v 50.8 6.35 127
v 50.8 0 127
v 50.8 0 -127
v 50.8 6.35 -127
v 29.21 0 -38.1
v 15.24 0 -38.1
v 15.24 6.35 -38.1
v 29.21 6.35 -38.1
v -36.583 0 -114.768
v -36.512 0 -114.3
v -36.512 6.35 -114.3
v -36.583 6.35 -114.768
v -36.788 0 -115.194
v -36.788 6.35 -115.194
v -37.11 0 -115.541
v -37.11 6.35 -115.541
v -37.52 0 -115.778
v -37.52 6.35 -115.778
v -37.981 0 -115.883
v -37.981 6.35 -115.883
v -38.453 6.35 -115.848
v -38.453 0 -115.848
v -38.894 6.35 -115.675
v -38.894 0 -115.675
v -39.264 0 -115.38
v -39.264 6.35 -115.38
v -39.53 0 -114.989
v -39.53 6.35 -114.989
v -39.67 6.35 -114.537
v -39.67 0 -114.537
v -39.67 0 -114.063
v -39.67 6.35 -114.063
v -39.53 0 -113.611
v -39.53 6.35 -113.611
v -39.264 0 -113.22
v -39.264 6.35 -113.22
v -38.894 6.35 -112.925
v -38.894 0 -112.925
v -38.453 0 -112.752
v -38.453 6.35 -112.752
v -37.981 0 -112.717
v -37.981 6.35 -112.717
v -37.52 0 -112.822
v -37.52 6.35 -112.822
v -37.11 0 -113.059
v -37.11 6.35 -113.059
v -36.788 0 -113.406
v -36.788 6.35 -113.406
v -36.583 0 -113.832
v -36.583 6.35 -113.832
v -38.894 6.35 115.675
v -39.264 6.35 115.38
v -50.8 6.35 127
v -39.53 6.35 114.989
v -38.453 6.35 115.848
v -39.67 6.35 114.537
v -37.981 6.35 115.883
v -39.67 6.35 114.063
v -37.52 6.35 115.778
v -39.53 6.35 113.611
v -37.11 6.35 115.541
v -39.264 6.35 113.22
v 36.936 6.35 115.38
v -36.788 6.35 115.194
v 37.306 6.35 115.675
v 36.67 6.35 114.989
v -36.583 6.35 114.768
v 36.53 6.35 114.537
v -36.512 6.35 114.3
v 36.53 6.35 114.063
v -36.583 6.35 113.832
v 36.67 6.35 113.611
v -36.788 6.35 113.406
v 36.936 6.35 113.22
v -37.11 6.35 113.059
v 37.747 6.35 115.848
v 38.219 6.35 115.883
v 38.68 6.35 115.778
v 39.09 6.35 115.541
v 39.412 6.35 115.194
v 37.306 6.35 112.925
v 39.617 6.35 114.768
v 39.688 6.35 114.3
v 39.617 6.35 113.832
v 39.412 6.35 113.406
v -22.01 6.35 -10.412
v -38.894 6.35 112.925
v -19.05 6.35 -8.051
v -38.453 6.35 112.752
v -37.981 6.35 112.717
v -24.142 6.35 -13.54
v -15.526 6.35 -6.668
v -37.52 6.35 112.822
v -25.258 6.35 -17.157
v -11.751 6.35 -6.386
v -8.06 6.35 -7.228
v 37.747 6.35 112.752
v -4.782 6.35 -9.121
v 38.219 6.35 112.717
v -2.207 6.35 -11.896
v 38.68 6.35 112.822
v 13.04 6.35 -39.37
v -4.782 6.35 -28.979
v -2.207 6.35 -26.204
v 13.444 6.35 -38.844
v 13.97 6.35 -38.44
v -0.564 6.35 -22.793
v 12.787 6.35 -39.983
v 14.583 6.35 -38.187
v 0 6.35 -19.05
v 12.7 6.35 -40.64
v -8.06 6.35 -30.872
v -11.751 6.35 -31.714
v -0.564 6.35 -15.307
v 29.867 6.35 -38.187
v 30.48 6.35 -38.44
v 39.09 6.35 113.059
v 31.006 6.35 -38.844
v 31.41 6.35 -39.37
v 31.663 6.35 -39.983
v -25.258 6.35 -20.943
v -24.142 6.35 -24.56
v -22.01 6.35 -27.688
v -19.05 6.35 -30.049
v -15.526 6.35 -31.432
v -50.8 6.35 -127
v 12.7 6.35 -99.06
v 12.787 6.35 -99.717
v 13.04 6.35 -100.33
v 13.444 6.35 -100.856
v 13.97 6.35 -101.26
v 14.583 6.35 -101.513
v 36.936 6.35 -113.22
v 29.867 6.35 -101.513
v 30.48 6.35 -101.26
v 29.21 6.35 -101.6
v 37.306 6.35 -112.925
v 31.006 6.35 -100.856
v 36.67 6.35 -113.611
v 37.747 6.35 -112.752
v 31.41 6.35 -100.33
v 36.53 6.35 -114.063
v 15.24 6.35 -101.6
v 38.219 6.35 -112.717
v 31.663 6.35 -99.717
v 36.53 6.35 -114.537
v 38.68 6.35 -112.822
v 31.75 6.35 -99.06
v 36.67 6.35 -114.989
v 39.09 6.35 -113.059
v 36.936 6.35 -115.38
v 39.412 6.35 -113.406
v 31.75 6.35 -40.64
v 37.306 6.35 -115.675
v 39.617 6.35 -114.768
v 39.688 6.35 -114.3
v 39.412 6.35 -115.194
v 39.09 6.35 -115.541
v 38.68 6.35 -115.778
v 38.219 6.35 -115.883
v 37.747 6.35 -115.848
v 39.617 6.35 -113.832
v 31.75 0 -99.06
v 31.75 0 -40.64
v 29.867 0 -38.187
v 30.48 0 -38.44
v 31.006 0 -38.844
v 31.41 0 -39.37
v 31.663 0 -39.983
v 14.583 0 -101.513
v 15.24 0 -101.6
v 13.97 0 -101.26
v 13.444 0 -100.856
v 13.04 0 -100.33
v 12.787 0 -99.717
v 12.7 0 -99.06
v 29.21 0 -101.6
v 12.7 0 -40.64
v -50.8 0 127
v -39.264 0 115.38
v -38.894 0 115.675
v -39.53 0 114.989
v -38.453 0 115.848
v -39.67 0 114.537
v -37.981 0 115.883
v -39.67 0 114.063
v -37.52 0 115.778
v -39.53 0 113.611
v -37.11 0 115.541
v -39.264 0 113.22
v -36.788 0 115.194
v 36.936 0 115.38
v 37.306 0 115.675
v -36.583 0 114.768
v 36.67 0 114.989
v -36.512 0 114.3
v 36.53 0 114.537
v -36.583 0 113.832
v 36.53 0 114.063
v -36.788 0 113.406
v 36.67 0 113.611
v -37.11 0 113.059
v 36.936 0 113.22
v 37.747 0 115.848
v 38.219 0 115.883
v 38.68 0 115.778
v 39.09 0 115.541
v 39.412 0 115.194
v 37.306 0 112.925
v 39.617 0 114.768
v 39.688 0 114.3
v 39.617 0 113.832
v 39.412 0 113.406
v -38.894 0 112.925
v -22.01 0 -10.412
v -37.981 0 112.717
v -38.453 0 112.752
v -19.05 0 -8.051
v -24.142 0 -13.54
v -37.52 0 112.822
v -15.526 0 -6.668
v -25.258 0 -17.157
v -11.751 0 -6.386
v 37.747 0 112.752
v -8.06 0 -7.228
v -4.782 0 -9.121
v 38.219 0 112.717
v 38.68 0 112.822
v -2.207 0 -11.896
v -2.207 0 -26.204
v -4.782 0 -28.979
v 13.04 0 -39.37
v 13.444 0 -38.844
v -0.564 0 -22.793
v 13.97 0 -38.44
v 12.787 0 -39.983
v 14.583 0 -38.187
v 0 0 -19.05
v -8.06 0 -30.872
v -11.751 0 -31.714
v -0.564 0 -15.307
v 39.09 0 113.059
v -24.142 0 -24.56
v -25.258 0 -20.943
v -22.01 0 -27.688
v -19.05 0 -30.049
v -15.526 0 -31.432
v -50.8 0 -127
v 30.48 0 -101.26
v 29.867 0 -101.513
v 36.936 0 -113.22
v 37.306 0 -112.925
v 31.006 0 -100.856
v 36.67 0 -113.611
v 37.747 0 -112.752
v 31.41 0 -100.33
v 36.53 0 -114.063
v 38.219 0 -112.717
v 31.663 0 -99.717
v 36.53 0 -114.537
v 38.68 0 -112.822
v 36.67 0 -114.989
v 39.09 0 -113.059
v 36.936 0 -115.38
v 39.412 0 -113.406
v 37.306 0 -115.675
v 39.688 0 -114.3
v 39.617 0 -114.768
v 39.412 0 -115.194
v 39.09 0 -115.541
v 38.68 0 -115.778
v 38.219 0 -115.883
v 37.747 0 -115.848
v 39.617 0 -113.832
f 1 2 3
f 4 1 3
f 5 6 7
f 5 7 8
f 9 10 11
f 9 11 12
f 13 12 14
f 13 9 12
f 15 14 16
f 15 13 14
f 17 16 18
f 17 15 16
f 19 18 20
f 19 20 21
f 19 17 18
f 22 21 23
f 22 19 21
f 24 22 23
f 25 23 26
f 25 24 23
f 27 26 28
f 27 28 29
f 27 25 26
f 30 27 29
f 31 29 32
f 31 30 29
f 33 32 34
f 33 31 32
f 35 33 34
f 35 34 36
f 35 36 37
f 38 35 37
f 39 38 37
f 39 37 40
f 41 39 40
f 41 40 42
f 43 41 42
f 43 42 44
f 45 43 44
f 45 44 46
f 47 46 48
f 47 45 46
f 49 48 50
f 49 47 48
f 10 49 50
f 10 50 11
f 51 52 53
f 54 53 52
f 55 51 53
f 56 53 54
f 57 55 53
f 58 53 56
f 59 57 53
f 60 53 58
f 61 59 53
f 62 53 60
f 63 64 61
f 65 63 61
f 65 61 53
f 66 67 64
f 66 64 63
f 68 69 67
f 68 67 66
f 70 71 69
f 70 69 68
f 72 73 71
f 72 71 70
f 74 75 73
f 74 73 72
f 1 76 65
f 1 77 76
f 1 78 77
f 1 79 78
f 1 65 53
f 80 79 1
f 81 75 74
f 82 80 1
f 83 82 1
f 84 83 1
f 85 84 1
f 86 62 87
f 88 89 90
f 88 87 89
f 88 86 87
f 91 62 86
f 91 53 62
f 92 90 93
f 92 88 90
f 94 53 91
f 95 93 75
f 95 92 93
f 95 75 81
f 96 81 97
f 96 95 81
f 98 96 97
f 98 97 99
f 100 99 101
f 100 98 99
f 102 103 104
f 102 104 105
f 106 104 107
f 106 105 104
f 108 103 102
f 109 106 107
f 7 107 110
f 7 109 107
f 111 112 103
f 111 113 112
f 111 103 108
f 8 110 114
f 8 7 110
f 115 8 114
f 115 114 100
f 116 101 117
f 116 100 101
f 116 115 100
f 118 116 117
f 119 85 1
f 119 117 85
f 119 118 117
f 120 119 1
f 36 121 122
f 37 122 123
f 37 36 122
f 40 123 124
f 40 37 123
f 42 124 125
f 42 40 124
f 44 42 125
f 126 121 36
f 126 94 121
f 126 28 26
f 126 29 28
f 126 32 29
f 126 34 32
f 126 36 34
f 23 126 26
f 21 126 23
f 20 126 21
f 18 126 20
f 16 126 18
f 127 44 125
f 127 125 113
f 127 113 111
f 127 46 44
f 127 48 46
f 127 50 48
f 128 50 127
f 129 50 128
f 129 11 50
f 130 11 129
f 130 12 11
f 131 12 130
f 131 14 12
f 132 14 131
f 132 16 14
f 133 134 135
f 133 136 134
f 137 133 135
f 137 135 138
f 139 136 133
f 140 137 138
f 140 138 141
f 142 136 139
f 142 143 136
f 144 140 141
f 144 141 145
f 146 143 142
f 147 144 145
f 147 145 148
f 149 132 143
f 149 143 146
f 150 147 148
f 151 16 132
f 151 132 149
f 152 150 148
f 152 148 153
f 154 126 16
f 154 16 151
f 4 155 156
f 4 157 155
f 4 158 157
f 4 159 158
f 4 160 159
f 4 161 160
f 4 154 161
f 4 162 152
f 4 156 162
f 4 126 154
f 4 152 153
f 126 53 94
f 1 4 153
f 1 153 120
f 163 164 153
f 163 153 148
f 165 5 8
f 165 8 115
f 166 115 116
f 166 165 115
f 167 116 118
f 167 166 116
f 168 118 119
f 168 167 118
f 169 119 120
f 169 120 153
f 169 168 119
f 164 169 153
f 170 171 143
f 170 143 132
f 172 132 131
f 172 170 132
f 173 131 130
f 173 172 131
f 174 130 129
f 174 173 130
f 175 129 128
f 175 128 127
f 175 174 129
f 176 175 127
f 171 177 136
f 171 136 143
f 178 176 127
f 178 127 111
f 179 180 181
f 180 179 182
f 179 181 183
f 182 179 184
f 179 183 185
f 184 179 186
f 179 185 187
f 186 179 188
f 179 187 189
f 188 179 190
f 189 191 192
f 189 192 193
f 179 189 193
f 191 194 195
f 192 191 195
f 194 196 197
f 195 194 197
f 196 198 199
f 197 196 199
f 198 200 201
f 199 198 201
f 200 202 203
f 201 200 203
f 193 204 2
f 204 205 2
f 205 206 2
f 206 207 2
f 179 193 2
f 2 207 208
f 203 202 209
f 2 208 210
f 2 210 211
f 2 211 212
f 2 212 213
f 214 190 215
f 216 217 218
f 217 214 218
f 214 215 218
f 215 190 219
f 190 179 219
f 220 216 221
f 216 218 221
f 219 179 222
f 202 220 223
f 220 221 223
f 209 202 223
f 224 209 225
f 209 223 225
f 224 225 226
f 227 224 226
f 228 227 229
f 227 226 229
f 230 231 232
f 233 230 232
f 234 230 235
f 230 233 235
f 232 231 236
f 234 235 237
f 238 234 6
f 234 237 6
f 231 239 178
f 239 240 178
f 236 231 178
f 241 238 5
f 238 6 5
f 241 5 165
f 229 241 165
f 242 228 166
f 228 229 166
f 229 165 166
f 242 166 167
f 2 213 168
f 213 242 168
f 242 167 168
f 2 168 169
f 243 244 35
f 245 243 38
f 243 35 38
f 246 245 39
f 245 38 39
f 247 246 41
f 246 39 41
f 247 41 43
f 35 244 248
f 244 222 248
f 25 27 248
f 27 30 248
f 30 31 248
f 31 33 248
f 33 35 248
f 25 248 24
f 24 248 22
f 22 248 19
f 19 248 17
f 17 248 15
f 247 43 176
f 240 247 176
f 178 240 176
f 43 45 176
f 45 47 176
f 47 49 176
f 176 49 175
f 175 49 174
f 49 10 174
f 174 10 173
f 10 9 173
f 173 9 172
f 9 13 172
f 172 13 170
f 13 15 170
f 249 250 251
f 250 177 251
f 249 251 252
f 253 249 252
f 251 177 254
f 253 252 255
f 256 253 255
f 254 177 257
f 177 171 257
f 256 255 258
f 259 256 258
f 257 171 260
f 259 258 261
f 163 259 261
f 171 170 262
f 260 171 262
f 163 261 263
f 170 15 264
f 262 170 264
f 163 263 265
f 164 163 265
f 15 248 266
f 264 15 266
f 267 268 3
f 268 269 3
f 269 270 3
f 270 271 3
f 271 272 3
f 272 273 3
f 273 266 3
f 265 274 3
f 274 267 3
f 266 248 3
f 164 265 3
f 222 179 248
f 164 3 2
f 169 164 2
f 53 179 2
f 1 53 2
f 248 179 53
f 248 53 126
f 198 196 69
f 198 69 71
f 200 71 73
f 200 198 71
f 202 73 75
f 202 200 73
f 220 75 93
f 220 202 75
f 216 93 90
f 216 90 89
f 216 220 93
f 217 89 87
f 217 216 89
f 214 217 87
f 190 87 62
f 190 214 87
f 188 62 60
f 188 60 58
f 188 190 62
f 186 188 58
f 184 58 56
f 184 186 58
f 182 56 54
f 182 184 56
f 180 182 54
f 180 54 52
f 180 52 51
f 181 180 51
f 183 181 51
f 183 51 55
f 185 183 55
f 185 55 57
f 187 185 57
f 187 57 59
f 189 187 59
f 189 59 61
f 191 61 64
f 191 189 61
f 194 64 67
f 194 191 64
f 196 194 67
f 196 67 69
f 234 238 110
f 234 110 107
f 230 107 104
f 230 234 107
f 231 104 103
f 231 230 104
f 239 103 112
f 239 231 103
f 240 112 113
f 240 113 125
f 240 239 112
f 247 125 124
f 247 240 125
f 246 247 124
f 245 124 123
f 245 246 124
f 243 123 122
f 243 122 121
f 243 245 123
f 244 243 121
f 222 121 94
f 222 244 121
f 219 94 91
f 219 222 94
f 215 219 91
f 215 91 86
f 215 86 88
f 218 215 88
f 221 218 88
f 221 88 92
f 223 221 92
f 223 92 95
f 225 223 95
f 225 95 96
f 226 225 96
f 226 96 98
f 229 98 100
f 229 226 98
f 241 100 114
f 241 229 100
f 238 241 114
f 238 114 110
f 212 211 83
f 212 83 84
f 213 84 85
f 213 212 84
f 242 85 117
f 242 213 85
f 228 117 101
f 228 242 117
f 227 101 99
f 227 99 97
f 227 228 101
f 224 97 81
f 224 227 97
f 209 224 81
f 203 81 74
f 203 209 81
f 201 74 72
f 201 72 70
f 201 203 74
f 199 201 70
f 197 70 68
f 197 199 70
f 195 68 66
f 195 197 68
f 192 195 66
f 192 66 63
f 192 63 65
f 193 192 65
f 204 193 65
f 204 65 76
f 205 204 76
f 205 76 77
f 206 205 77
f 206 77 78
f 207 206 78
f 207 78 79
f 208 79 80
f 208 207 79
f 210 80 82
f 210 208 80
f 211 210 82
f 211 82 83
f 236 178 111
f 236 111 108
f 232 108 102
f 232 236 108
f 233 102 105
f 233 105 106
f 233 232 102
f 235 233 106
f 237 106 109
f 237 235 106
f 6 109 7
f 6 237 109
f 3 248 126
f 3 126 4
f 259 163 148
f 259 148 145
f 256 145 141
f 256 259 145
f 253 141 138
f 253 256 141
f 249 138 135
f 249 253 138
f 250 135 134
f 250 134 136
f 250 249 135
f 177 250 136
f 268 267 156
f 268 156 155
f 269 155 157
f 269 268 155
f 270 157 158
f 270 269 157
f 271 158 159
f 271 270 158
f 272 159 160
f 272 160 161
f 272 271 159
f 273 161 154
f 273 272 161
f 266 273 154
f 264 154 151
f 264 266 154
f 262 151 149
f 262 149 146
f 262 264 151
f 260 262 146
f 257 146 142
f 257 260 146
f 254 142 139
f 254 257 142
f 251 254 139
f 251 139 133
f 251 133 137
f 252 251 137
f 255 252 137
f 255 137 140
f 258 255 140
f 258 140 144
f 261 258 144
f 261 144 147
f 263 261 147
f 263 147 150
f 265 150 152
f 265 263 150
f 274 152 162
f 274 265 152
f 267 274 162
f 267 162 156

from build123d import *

# Parameters (mm, degrees)
SKETCH1_W           = 101.6
SKETCH1_H           = 254
SKETCH1_R           = 12.7
SKETCH1_R_2         = 1.5875
BOSS_EXTRUDE1_DEPTH = 6.35


with BuildPart() as part:
    # Sketch1 → Boss-Extrude1 (new body)
    with BuildSketch(Plane(origin=(0, 0, 0), x_dir=(1, 0, 0), z_dir=(0, 1, 0))):
        Rectangle(SKETCH1_W, SKETCH1_H)
        with Locations((-12.7, 19.05)):
            Circle(SKETCH1_R, mode=Mode.SUBTRACT)
        with Locations((-38.1, -114.3)):
            Circle(SKETCH1_R_2, mode=Mode.SUBTRACT)
        with Locations((38.1, -114.3)):
            Circle(SKETCH1_R_2, mode=Mode.SUBTRACT)
        with Locations((38.1, 114.3)):
            Circle(SKETCH1_R_2, mode=Mode.SUBTRACT)
        with Locations((-38.1, 114.3)):
            Circle(SKETCH1_R_2, mode=Mode.SUBTRACT)
        with BuildLine():
            Line((29.21, 101.6), (15.24, 101.6))
            ThreePointArc((15.24, 101.6), (13.443948776, 100.856051224), (12.7, 99.06))
            Line((12.7, 99.06), (12.7, 40.64))
            ThreePointArc((12.7, 40.64), (13.443948776, 38.843948776), (15.24, 38.1))
            Line((15.24, 38.1), (29.21, 38.1))
            ThreePointArc((29.21, 38.1), (31.006051224, 38.843948776), (31.75, 40.64))
            Line((31.75, 40.64), (31.75, 99.06))
            ThreePointArc((31.75, 99.06), (31.006051224, 100.856051224), (29.21, 101.6))
        make_face(mode=Mode.SUBTRACT)
    extrude(amount=BOSS_EXTRUDE1_DEPTH)


solid = part.part
